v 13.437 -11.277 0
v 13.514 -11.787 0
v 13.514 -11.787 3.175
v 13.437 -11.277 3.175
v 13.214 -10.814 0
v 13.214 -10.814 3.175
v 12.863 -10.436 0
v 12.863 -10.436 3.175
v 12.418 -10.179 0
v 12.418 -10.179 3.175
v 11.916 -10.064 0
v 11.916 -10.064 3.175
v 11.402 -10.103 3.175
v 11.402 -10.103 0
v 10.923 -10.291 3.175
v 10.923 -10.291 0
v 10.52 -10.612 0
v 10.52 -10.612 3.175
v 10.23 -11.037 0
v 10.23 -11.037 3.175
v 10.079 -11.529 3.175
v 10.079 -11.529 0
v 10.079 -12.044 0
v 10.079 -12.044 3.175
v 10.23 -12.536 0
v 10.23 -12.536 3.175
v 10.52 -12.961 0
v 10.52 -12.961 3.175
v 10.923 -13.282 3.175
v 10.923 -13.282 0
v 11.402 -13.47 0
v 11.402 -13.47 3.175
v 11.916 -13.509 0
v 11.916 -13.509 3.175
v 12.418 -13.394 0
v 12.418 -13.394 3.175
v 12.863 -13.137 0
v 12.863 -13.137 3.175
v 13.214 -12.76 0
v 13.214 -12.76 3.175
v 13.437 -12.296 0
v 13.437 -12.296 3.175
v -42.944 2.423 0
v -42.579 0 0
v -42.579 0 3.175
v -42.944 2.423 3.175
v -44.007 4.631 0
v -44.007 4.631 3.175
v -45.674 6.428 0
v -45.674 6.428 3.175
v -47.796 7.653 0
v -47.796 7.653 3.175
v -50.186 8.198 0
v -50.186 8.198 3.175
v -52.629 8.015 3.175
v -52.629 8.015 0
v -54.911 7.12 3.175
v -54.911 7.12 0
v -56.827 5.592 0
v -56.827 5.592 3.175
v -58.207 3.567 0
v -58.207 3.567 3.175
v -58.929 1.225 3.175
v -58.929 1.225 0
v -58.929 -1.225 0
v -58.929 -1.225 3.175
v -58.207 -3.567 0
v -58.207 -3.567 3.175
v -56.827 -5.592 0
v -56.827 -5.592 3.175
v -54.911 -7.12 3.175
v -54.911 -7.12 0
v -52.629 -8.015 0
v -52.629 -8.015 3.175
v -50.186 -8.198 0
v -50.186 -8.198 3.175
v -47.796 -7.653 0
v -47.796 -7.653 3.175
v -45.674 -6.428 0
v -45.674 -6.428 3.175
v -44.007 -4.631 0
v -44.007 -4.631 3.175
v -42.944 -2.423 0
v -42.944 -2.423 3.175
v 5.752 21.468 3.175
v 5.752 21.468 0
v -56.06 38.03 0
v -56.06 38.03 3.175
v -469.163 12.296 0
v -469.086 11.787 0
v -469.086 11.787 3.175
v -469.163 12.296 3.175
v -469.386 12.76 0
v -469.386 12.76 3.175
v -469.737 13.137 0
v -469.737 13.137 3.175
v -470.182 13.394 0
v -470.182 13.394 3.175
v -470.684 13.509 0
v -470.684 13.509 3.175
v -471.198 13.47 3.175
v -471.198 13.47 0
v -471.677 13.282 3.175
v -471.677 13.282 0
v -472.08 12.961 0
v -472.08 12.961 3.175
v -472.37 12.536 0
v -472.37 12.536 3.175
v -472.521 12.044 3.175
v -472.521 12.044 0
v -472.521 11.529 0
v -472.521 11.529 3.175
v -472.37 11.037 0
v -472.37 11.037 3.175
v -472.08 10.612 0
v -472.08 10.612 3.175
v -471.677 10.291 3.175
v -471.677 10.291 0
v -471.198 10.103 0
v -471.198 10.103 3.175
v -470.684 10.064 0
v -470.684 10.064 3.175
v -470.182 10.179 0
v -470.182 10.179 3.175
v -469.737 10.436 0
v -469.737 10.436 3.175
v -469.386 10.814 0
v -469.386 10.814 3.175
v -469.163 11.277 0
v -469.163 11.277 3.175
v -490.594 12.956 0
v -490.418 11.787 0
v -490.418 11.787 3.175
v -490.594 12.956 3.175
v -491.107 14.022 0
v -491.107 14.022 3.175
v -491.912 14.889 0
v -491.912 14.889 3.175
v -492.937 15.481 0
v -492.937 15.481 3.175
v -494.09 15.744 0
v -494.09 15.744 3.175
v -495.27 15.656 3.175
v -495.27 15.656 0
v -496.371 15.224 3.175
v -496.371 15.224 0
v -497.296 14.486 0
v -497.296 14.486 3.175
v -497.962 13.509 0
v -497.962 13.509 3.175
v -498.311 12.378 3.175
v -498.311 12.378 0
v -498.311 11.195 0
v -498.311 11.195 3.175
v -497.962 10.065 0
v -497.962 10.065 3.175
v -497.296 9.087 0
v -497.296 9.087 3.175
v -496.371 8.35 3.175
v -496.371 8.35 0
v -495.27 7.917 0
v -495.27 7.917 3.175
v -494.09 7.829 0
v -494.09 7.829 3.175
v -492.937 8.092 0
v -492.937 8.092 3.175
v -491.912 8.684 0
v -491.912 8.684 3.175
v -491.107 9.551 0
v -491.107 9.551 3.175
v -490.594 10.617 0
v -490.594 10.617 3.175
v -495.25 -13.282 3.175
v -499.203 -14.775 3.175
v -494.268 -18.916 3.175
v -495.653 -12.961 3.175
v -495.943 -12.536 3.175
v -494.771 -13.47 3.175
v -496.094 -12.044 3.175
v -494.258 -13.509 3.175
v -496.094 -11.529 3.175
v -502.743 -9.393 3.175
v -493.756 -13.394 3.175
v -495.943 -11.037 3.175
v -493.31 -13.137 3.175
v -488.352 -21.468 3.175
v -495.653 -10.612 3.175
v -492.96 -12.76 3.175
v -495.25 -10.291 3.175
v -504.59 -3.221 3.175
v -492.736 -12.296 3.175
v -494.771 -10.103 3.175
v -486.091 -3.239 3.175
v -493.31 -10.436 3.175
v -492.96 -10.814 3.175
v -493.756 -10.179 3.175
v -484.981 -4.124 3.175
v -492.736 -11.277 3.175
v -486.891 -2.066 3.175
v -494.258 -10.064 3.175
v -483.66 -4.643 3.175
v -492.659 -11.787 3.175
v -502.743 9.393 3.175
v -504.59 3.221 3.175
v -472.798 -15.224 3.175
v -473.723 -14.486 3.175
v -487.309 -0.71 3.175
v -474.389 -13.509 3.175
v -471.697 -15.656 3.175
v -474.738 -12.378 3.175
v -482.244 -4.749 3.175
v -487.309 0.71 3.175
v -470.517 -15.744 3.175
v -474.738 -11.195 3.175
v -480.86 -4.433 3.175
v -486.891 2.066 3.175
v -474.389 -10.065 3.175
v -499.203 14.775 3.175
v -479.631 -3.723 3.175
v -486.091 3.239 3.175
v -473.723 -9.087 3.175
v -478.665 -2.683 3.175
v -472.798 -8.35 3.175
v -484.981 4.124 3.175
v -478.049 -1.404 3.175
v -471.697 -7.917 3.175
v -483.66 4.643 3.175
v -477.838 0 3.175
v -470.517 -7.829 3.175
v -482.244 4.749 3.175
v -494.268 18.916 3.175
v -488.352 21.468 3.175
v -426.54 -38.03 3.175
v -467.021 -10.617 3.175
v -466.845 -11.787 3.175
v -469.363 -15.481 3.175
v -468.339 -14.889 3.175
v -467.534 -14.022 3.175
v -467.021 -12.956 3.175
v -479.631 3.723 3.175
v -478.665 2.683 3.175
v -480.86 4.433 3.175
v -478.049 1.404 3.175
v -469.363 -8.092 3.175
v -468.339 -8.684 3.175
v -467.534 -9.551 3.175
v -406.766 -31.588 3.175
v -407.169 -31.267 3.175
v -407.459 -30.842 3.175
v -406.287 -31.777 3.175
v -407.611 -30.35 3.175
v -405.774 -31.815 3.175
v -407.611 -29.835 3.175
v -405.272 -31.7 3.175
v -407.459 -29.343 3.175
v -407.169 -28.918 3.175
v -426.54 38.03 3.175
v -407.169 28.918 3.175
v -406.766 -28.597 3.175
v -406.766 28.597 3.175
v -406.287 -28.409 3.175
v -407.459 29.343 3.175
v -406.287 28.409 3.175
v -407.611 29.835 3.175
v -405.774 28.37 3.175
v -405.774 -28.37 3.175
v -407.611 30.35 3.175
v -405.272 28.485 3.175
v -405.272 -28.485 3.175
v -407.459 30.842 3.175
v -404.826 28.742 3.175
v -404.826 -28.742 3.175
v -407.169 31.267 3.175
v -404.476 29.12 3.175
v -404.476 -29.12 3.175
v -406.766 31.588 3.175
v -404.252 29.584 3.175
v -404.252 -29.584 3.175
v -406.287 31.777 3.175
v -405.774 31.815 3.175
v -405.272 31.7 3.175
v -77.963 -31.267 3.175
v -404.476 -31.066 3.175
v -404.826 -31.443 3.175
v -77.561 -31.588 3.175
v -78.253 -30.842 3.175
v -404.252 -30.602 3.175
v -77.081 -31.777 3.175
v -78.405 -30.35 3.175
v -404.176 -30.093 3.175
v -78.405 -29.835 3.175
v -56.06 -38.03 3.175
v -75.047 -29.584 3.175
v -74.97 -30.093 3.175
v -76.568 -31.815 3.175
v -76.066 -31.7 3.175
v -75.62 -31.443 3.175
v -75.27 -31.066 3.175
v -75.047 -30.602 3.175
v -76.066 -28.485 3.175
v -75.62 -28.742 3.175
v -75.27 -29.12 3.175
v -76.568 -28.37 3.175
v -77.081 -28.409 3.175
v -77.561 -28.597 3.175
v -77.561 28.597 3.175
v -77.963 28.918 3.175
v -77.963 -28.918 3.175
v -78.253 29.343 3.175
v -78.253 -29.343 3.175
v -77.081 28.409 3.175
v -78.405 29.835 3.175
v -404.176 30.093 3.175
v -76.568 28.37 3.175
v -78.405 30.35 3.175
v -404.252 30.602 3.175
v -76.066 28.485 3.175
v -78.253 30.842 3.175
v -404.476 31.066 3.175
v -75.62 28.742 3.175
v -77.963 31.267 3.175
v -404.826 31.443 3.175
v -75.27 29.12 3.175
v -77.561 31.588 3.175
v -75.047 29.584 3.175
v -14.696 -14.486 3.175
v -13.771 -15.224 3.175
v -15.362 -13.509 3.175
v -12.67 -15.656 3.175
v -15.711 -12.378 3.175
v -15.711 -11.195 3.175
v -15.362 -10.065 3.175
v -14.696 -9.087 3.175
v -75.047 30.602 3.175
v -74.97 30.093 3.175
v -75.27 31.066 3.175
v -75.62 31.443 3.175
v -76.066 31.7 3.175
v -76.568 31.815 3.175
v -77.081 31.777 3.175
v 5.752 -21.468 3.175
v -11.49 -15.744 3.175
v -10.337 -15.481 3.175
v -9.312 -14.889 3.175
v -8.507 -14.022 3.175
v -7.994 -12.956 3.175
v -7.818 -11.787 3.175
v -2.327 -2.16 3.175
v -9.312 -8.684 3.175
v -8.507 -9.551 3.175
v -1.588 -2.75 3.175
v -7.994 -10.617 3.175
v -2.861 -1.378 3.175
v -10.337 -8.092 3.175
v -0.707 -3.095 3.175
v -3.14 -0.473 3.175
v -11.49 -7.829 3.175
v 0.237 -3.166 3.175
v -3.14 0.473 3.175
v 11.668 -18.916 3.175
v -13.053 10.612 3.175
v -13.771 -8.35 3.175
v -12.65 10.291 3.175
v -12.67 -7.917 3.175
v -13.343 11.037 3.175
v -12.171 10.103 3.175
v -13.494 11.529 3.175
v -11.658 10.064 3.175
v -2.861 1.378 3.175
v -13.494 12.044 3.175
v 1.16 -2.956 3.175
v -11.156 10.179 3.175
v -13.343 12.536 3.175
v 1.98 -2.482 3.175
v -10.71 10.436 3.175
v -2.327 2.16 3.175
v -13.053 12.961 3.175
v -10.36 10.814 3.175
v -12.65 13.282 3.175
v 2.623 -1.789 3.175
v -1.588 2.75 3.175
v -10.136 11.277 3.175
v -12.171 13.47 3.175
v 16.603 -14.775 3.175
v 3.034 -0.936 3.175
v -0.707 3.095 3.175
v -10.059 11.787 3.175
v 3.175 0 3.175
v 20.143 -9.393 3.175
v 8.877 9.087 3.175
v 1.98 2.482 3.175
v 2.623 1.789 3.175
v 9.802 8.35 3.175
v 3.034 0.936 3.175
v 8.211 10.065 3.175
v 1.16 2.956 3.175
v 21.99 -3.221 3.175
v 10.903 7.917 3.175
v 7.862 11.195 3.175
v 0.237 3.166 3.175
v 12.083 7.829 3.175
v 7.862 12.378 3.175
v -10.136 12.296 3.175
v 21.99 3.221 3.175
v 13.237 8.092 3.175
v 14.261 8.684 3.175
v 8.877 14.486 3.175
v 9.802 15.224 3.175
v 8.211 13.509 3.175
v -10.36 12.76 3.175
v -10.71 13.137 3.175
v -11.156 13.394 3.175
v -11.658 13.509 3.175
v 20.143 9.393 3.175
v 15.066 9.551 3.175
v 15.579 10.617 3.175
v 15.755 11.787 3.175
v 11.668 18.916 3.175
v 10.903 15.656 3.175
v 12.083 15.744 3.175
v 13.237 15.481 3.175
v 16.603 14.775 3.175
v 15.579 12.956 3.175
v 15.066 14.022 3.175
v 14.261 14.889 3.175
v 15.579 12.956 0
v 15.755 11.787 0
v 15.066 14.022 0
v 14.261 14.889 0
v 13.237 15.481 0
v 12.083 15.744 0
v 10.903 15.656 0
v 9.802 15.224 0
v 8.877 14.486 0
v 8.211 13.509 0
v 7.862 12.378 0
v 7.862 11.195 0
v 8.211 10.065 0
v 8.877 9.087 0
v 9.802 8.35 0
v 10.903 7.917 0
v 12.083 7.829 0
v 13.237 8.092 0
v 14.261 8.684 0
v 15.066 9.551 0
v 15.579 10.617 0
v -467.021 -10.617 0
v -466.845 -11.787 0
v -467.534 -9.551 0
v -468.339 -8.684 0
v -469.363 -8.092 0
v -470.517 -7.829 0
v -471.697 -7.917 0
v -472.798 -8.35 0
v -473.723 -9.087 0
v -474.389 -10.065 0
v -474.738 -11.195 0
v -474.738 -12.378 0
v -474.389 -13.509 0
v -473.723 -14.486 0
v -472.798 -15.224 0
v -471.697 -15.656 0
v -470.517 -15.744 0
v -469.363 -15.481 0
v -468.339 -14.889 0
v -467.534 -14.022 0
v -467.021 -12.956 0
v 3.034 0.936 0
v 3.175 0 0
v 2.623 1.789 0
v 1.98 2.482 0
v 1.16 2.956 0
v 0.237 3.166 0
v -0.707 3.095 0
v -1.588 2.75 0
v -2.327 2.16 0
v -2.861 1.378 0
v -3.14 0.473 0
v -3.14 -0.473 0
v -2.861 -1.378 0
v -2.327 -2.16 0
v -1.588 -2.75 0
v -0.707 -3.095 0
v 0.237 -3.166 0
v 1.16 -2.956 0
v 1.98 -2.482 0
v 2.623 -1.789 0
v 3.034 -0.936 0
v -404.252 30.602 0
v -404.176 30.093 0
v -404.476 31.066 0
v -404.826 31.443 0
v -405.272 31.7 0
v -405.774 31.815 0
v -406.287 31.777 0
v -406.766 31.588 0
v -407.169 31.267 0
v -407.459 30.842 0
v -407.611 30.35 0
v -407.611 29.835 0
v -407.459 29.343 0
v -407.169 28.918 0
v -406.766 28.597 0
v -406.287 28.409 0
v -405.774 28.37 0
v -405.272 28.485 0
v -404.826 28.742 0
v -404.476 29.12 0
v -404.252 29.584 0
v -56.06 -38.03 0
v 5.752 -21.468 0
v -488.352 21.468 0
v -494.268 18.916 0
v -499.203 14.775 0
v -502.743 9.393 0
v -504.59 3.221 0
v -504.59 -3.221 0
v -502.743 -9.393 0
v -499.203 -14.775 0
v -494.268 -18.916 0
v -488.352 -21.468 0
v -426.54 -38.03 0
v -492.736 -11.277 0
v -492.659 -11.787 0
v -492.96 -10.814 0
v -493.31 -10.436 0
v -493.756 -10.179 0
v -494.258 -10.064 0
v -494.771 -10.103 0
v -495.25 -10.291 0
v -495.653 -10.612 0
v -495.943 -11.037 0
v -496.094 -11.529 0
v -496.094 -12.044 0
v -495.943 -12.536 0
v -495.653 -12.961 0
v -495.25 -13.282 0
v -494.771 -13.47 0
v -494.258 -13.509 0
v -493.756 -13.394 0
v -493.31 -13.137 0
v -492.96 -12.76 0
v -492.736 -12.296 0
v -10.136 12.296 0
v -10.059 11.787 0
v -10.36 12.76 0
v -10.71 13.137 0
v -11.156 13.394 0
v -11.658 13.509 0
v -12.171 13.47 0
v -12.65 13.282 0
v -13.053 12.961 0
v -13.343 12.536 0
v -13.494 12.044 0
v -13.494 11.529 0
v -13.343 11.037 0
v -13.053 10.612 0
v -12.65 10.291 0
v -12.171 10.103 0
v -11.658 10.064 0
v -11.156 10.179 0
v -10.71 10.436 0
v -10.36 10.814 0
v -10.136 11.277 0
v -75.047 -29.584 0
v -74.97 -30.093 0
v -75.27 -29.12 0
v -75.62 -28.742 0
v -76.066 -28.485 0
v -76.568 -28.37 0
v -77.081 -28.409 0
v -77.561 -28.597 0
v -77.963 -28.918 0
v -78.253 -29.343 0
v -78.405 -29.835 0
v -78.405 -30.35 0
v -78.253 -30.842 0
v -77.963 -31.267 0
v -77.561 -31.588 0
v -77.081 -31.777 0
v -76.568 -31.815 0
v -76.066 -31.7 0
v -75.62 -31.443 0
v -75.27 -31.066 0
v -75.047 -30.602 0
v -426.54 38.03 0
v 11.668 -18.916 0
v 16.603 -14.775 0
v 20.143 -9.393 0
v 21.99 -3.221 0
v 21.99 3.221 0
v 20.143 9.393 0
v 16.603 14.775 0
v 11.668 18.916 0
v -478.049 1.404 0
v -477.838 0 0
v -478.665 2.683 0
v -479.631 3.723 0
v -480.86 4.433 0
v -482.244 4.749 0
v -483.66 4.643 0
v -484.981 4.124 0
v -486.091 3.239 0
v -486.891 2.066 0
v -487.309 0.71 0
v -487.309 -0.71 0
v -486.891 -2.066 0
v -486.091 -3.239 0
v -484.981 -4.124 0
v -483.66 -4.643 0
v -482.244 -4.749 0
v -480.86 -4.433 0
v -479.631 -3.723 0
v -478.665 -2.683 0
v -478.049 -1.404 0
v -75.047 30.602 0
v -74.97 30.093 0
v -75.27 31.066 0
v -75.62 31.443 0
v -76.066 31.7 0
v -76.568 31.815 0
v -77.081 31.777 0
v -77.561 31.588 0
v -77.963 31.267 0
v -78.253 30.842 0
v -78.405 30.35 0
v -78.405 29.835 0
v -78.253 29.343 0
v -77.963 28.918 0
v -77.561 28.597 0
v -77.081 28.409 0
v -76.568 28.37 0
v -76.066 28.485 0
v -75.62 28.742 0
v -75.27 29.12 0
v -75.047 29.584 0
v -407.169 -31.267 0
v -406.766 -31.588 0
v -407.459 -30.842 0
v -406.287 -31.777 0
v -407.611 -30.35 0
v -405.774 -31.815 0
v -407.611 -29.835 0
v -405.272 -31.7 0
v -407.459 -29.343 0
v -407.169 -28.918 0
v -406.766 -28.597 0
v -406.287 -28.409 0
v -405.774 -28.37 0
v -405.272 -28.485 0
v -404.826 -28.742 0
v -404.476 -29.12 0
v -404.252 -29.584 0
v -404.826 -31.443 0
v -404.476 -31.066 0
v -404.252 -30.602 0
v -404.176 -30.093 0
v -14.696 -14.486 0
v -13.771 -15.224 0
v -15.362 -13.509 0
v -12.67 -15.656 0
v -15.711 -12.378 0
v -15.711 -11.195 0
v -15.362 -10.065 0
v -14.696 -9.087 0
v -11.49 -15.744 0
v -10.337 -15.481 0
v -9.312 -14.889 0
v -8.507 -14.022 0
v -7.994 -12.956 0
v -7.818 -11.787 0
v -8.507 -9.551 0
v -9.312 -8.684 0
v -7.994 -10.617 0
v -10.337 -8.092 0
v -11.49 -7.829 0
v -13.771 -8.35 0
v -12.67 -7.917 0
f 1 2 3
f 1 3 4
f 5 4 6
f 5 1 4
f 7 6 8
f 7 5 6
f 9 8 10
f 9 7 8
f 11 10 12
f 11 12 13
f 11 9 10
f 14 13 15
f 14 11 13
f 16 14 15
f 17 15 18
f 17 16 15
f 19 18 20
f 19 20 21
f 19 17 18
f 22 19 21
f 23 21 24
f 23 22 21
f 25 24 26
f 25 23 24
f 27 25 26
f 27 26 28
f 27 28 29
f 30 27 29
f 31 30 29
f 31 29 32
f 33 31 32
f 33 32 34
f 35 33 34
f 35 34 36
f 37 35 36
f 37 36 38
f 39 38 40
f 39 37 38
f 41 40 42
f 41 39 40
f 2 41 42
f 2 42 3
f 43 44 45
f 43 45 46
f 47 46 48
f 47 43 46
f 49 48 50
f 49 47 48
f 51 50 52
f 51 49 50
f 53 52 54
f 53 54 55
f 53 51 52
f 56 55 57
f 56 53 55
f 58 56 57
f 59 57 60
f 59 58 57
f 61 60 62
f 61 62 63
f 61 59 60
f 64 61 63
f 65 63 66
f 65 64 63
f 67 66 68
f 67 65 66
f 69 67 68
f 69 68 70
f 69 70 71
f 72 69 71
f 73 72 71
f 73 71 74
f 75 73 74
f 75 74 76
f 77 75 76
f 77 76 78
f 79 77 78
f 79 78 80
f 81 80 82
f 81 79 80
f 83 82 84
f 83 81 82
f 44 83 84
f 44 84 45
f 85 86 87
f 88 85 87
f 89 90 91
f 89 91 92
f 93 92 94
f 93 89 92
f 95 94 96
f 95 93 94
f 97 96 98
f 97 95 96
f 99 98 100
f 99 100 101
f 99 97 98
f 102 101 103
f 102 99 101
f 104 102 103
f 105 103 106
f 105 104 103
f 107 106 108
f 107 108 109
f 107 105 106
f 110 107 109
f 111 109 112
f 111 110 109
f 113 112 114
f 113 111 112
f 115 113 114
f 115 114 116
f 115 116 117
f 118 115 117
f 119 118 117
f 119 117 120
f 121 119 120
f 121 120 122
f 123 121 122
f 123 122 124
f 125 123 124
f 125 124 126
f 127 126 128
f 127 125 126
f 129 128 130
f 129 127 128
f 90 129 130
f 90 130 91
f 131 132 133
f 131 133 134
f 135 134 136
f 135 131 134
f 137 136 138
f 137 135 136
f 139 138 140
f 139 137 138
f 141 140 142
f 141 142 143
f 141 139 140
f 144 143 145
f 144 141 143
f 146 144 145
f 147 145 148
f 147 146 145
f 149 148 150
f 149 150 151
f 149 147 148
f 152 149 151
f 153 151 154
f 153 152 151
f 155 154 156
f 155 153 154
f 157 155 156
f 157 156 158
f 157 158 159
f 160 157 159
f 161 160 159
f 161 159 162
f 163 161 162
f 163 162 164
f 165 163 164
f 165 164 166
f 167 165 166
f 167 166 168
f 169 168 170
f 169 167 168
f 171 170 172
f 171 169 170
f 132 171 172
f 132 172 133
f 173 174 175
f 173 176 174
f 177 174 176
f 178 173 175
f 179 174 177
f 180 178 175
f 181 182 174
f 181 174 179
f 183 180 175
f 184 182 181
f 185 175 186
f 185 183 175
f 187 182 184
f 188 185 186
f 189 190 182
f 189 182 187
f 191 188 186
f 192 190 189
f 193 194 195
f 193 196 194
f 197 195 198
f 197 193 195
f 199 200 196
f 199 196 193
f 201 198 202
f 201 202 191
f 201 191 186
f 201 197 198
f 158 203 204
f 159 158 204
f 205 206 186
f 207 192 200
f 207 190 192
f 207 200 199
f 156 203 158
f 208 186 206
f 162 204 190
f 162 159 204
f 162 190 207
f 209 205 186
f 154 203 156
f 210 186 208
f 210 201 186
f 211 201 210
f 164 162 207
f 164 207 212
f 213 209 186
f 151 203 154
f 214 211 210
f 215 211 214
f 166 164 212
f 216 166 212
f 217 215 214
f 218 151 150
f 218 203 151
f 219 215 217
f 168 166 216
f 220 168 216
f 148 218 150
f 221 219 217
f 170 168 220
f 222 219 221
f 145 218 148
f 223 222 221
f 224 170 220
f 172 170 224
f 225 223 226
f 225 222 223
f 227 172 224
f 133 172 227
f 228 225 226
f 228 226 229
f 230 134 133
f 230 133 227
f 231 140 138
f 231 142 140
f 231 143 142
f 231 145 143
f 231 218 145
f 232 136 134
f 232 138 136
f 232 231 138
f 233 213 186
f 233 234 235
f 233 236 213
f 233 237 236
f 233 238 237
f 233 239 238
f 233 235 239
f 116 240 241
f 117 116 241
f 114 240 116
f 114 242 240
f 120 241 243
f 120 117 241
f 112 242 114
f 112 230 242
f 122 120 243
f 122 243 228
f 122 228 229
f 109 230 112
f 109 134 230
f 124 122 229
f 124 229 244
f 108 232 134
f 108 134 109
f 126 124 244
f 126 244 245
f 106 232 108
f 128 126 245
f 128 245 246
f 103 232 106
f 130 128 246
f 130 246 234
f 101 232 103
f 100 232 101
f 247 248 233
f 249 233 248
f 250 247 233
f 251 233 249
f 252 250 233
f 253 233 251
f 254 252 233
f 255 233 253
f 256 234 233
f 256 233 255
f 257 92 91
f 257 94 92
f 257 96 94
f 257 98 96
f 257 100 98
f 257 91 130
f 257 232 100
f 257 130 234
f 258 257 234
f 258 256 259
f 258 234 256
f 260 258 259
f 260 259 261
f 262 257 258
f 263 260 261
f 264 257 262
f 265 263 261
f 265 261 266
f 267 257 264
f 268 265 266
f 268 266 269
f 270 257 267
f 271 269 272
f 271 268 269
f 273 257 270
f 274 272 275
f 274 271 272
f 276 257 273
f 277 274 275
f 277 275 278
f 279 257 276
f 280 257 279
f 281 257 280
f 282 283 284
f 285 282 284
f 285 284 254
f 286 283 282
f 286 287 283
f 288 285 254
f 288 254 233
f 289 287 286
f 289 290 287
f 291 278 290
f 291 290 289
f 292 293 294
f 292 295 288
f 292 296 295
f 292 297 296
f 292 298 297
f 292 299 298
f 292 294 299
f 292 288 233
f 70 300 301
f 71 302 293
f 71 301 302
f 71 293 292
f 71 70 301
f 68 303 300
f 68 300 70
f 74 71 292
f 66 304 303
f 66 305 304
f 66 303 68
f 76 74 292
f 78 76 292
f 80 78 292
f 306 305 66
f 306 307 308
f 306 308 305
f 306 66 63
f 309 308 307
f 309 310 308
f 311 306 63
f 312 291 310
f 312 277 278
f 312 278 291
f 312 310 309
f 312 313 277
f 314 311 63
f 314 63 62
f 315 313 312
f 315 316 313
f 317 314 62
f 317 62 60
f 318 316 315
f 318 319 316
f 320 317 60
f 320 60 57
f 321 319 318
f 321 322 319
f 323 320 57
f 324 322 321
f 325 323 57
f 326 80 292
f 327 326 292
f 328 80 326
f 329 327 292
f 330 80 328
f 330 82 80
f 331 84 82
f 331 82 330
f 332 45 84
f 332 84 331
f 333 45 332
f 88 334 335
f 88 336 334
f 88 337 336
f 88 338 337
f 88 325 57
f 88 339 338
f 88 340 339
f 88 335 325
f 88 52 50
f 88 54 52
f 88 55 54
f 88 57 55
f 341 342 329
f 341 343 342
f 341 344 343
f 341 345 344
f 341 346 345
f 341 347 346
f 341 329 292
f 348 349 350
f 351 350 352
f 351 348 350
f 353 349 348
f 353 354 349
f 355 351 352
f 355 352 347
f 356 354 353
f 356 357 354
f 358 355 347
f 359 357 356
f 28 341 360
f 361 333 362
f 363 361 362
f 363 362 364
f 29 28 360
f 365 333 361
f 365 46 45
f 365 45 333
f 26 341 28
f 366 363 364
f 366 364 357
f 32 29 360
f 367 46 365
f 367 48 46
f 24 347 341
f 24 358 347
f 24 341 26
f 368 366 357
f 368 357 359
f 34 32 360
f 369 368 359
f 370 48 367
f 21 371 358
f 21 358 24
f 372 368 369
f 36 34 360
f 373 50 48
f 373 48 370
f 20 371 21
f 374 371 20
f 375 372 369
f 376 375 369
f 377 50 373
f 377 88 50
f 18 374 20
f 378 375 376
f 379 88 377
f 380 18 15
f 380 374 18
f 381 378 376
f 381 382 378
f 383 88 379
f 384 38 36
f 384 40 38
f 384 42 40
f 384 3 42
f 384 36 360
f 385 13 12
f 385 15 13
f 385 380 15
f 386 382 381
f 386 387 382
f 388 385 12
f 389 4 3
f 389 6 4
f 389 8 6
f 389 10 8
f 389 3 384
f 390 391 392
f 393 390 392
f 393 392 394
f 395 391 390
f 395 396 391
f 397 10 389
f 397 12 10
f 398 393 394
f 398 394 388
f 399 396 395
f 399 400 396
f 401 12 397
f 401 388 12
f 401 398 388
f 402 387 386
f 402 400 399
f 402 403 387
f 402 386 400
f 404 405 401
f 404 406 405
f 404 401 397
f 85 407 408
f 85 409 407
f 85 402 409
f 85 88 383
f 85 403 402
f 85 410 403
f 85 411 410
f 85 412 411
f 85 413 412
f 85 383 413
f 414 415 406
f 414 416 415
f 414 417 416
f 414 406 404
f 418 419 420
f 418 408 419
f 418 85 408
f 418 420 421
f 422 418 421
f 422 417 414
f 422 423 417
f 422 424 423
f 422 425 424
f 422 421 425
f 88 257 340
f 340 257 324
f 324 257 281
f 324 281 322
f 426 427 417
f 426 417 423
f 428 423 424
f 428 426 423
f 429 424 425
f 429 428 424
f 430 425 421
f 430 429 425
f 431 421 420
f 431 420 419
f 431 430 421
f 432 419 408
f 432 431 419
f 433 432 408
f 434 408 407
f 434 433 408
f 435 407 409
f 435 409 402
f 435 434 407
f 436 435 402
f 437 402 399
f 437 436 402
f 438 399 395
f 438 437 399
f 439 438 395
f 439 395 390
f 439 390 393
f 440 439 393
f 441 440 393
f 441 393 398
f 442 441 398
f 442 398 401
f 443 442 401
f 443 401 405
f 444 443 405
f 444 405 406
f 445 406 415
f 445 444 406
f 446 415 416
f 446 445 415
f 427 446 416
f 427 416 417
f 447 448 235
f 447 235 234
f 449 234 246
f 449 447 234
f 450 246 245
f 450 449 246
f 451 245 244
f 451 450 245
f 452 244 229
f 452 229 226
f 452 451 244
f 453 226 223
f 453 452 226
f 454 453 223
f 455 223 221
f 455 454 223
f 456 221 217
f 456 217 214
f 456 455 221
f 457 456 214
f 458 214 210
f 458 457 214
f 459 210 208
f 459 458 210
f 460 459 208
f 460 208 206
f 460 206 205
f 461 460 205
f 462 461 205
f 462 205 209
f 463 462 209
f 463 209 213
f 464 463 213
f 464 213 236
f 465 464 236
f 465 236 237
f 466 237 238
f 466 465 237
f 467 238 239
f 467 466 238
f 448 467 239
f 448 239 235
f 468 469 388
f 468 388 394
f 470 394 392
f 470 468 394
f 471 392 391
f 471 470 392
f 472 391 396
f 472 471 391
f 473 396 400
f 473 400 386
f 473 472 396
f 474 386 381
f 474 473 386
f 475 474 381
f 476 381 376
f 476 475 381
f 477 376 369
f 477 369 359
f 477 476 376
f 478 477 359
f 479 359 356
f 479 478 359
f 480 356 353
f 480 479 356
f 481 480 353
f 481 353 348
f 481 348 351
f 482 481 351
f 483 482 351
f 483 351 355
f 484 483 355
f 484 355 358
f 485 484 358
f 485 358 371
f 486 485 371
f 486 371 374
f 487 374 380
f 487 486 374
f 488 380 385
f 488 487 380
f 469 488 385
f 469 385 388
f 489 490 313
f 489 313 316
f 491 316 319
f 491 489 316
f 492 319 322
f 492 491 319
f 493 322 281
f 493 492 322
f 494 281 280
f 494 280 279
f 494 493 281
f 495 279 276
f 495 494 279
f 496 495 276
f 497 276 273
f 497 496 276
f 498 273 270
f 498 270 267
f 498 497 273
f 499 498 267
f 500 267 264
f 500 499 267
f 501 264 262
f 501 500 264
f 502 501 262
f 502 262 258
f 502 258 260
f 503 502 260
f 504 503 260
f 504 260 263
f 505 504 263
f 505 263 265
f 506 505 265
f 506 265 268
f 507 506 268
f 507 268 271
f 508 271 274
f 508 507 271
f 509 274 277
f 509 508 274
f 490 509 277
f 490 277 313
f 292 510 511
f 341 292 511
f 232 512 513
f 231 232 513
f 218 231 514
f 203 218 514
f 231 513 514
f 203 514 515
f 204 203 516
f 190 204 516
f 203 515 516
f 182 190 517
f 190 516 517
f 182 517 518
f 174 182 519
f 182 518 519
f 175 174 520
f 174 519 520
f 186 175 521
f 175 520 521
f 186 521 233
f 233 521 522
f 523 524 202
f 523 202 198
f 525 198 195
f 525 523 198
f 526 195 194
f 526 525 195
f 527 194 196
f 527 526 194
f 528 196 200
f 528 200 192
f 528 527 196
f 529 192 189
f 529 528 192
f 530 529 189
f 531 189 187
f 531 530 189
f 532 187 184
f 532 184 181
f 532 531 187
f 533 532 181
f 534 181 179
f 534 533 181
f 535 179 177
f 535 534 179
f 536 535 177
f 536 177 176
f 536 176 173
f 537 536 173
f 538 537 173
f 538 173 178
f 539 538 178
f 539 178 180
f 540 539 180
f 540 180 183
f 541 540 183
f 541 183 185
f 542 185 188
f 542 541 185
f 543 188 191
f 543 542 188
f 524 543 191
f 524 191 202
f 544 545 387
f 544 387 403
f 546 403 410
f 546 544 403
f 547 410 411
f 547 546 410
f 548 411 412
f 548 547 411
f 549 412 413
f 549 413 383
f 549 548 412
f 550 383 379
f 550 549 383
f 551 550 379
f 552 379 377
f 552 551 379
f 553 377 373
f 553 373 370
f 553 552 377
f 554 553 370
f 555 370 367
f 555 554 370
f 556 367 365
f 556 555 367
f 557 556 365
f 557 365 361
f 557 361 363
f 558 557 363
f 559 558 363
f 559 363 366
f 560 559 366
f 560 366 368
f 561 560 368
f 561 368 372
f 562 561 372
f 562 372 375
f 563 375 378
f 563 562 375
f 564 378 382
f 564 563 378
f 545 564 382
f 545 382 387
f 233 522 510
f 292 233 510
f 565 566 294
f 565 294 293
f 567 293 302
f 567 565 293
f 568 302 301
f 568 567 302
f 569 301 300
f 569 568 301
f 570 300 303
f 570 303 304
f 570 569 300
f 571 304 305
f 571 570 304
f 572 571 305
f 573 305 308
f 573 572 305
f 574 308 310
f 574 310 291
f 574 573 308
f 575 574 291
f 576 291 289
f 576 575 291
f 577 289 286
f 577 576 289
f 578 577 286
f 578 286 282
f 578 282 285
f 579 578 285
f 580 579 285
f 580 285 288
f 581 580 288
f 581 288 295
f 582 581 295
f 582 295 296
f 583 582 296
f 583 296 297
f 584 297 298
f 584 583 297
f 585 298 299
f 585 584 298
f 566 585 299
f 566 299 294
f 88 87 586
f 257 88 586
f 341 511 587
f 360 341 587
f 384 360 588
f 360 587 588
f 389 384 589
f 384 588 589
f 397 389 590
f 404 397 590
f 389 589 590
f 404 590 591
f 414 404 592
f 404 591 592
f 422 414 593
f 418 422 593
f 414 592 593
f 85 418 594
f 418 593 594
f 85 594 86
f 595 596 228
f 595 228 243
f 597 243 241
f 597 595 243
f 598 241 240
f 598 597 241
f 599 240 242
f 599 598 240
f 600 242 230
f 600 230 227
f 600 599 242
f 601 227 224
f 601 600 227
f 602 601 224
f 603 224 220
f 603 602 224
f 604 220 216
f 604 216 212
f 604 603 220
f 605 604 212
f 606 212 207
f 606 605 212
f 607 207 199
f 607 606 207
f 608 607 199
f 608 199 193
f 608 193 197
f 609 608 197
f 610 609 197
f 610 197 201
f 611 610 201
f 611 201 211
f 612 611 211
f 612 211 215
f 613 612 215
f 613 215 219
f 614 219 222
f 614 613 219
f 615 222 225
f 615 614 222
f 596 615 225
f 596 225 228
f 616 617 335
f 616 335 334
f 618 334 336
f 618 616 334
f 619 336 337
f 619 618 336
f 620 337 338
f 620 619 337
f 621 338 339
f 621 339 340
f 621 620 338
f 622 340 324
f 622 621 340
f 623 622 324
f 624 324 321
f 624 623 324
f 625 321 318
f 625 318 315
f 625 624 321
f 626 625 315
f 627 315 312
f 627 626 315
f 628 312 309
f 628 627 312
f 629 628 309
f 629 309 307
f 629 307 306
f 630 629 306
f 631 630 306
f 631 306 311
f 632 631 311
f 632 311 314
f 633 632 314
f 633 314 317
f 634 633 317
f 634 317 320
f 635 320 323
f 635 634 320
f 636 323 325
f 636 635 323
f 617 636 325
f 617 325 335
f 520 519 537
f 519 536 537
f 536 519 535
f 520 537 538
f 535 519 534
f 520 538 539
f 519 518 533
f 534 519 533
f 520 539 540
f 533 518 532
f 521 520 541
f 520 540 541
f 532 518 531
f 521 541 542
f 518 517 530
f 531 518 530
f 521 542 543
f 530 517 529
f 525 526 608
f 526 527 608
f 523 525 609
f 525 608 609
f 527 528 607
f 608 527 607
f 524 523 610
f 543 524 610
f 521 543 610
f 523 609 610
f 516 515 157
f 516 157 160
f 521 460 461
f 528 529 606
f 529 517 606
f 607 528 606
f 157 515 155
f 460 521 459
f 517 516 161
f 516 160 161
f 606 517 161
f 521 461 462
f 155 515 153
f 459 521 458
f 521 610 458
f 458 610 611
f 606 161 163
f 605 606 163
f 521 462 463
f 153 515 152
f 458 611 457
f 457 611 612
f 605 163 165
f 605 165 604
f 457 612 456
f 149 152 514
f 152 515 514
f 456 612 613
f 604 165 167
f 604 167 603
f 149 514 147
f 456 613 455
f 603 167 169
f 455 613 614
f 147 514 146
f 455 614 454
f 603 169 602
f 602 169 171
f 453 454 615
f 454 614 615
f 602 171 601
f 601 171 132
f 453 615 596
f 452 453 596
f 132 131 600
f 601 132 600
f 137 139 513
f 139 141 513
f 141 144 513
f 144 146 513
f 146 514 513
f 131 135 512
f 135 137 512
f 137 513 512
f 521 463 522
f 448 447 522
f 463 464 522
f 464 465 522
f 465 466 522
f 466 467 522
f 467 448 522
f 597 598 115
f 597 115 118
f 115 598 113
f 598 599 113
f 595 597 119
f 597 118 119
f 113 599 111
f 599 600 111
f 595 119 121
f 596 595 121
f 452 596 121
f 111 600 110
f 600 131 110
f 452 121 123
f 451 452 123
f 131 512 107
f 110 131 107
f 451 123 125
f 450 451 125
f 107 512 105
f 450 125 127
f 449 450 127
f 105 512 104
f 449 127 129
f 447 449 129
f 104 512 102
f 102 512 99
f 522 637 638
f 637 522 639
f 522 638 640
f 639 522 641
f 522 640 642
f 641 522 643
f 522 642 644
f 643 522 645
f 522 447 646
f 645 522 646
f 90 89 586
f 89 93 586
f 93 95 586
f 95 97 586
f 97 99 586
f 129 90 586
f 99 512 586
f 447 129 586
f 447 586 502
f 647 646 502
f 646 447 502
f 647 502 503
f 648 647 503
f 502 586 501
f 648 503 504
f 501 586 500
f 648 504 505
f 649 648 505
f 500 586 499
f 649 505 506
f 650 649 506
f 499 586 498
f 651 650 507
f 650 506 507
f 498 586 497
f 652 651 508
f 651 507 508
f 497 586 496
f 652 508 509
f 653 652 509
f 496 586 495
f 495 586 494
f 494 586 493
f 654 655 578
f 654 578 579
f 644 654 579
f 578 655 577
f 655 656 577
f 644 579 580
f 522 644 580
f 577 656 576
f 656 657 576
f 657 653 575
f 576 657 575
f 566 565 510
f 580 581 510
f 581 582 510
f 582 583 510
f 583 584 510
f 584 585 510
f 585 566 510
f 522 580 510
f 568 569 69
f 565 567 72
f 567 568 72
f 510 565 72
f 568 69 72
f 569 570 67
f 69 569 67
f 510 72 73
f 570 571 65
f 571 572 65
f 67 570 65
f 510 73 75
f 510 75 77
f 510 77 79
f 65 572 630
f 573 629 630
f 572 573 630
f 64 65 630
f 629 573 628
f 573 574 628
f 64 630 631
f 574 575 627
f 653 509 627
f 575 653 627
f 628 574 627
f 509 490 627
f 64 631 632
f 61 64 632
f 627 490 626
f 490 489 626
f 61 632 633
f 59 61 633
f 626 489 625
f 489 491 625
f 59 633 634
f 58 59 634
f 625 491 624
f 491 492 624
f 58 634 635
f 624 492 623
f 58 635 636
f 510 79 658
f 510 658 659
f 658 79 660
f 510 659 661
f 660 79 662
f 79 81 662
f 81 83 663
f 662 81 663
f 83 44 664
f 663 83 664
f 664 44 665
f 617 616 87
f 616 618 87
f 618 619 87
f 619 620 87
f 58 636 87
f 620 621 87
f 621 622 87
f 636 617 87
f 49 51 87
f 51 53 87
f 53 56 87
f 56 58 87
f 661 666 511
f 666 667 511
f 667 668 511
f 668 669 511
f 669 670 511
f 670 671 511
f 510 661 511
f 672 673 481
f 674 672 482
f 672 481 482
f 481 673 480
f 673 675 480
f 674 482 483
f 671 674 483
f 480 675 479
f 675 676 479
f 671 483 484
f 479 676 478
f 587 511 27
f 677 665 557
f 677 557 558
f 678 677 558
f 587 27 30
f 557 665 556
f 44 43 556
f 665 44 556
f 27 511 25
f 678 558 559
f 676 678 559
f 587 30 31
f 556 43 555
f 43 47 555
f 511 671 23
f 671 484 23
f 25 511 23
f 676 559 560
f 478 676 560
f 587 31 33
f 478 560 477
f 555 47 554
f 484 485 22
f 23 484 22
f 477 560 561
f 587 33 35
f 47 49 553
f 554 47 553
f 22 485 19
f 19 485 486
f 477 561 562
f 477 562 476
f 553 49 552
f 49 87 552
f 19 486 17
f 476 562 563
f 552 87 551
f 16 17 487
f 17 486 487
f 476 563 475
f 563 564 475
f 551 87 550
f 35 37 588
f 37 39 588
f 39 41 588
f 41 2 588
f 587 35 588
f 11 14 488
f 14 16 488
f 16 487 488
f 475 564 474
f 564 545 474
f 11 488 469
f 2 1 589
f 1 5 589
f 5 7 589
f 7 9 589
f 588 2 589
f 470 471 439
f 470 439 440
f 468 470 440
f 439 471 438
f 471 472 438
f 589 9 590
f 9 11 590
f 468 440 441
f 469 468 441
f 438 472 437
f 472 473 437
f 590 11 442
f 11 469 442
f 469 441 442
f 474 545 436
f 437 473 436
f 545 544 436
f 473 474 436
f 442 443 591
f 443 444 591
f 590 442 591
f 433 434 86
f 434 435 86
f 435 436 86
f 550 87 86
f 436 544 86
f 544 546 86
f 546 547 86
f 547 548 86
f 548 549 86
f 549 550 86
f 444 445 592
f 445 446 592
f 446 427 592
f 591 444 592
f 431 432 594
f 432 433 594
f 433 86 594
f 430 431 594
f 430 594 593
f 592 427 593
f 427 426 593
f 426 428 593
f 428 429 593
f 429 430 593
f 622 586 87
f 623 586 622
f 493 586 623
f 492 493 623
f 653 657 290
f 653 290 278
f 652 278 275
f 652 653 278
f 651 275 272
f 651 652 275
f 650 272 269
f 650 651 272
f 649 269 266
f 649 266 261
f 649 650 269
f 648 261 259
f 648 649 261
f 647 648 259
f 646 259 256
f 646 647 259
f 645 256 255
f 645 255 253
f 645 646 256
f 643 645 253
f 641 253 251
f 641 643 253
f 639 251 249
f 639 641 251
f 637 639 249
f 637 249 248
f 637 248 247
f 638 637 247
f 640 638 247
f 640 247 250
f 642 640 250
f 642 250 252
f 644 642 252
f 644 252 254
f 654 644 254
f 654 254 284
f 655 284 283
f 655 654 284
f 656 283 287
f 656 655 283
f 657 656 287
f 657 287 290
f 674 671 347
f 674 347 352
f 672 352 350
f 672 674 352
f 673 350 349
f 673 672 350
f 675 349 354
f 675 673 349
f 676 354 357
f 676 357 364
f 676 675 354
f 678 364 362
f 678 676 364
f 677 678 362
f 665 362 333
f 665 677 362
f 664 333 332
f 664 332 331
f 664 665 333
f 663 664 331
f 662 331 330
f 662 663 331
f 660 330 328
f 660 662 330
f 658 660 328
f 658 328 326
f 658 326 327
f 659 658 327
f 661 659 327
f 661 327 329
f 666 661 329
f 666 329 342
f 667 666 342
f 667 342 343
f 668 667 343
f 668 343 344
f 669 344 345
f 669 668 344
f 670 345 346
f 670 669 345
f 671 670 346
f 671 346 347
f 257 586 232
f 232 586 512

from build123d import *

# Parameters (mm, degrees)
F0_R     = 1.7272
F0_R_2   = 3.96875
F0_R_3   = 4.7625
F0_R_4   = 8.221183
F0_R_5   = 3.175
F1_DEPTH = 3.175


with BuildPart() as f1:
    # F0 (on Top) → F1 (new body)
    with BuildSketch(Plane.XY):
        with BuildLine():
            Line((-426.540354, 38.03015), (-488.352253, 21.467701))
            ThreePointArc((-488.352253, 21.467701), (-504.825, 0), (-488.352253, -21.467701))
            Line((-488.352253, -21.467701), (-426.540354, -38.03015))
            Line((-426.540354, -38.03015), (-420.190354, -38.03015))
            Line((-420.190354, -38.03015), (-62.409646, -38.03015))
            Line((-62.409646, -38.03015), (-56.059646, -38.03015))
            Line((-56.059646, -38.03015), (5.752253, -21.467701))
            ThreePointArc((5.752253, -21.467701), (22.225, 0), (5.752253, 21.467701))
            Line((5.752253, 21.467701), (-56.059646, 38.03015))
            Line((-56.059646, 38.03015), (-62.409646, 38.03015))
            Line((-62.409646, 38.03015), (-420.190354, 38.03015))
            Line((-420.190354, 38.03015), (-426.540354, 38.03015))
        make_face()
        with Locations((-405.902854, -30.09265)):
            Circle(F0_R, mode=Mode.SUBTRACT)
        with Locations((-494.386586, -11.786586)):
            Circle(F0_R, mode=Mode.SUBTRACT)
        with Locations((-470.813414, -11.786586)):
            Circle(F0_R_2, mode=Mode.SUBTRACT)
        with Locations((-76.697146, -30.09265)):
            Circle(F0_R, mode=Mode.SUBTRACT)
        with Locations((-11.786586, -11.786586)):
            Circle(F0_R_2, mode=Mode.SUBTRACT)
        with Locations((11.786586, -11.786586)):
            Circle(F0_R, mode=Mode.SUBTRACT)
        with Locations((-482.6, 0)):
            Circle(F0_R_3, mode=Mode.SUBTRACT)
        with Locations((-494.386586, 11.786586)):
            Circle(F0_R_2, mode=Mode.SUBTRACT)
        with Locations((-470.813414, 11.786586)):
            Circle(F0_R, mode=Mode.SUBTRACT)
        with Locations((-405.902854, 30.09265)):
            Circle(F0_R, mode=Mode.SUBTRACT)
        with Locations((-50.8, 0)):
            Circle(F0_R_4, mode=Mode.SUBTRACT)
        Circle(F0_R_5, mode=Mode.SUBTRACT)
        with Locations((-11.786586, 11.786586)):
            Circle(F0_R, mode=Mode.SUBTRACT)
        with Locations((11.786586, 11.786586)):
            Circle(F0_R_2, mode=Mode.SUBTRACT)
        with Locations((-76.697146, 30.09265)):
            Circle(F0_R, mode=Mode.SUBTRACT)
    extrude(amount=F1_DEPTH)


solid = f1.part
